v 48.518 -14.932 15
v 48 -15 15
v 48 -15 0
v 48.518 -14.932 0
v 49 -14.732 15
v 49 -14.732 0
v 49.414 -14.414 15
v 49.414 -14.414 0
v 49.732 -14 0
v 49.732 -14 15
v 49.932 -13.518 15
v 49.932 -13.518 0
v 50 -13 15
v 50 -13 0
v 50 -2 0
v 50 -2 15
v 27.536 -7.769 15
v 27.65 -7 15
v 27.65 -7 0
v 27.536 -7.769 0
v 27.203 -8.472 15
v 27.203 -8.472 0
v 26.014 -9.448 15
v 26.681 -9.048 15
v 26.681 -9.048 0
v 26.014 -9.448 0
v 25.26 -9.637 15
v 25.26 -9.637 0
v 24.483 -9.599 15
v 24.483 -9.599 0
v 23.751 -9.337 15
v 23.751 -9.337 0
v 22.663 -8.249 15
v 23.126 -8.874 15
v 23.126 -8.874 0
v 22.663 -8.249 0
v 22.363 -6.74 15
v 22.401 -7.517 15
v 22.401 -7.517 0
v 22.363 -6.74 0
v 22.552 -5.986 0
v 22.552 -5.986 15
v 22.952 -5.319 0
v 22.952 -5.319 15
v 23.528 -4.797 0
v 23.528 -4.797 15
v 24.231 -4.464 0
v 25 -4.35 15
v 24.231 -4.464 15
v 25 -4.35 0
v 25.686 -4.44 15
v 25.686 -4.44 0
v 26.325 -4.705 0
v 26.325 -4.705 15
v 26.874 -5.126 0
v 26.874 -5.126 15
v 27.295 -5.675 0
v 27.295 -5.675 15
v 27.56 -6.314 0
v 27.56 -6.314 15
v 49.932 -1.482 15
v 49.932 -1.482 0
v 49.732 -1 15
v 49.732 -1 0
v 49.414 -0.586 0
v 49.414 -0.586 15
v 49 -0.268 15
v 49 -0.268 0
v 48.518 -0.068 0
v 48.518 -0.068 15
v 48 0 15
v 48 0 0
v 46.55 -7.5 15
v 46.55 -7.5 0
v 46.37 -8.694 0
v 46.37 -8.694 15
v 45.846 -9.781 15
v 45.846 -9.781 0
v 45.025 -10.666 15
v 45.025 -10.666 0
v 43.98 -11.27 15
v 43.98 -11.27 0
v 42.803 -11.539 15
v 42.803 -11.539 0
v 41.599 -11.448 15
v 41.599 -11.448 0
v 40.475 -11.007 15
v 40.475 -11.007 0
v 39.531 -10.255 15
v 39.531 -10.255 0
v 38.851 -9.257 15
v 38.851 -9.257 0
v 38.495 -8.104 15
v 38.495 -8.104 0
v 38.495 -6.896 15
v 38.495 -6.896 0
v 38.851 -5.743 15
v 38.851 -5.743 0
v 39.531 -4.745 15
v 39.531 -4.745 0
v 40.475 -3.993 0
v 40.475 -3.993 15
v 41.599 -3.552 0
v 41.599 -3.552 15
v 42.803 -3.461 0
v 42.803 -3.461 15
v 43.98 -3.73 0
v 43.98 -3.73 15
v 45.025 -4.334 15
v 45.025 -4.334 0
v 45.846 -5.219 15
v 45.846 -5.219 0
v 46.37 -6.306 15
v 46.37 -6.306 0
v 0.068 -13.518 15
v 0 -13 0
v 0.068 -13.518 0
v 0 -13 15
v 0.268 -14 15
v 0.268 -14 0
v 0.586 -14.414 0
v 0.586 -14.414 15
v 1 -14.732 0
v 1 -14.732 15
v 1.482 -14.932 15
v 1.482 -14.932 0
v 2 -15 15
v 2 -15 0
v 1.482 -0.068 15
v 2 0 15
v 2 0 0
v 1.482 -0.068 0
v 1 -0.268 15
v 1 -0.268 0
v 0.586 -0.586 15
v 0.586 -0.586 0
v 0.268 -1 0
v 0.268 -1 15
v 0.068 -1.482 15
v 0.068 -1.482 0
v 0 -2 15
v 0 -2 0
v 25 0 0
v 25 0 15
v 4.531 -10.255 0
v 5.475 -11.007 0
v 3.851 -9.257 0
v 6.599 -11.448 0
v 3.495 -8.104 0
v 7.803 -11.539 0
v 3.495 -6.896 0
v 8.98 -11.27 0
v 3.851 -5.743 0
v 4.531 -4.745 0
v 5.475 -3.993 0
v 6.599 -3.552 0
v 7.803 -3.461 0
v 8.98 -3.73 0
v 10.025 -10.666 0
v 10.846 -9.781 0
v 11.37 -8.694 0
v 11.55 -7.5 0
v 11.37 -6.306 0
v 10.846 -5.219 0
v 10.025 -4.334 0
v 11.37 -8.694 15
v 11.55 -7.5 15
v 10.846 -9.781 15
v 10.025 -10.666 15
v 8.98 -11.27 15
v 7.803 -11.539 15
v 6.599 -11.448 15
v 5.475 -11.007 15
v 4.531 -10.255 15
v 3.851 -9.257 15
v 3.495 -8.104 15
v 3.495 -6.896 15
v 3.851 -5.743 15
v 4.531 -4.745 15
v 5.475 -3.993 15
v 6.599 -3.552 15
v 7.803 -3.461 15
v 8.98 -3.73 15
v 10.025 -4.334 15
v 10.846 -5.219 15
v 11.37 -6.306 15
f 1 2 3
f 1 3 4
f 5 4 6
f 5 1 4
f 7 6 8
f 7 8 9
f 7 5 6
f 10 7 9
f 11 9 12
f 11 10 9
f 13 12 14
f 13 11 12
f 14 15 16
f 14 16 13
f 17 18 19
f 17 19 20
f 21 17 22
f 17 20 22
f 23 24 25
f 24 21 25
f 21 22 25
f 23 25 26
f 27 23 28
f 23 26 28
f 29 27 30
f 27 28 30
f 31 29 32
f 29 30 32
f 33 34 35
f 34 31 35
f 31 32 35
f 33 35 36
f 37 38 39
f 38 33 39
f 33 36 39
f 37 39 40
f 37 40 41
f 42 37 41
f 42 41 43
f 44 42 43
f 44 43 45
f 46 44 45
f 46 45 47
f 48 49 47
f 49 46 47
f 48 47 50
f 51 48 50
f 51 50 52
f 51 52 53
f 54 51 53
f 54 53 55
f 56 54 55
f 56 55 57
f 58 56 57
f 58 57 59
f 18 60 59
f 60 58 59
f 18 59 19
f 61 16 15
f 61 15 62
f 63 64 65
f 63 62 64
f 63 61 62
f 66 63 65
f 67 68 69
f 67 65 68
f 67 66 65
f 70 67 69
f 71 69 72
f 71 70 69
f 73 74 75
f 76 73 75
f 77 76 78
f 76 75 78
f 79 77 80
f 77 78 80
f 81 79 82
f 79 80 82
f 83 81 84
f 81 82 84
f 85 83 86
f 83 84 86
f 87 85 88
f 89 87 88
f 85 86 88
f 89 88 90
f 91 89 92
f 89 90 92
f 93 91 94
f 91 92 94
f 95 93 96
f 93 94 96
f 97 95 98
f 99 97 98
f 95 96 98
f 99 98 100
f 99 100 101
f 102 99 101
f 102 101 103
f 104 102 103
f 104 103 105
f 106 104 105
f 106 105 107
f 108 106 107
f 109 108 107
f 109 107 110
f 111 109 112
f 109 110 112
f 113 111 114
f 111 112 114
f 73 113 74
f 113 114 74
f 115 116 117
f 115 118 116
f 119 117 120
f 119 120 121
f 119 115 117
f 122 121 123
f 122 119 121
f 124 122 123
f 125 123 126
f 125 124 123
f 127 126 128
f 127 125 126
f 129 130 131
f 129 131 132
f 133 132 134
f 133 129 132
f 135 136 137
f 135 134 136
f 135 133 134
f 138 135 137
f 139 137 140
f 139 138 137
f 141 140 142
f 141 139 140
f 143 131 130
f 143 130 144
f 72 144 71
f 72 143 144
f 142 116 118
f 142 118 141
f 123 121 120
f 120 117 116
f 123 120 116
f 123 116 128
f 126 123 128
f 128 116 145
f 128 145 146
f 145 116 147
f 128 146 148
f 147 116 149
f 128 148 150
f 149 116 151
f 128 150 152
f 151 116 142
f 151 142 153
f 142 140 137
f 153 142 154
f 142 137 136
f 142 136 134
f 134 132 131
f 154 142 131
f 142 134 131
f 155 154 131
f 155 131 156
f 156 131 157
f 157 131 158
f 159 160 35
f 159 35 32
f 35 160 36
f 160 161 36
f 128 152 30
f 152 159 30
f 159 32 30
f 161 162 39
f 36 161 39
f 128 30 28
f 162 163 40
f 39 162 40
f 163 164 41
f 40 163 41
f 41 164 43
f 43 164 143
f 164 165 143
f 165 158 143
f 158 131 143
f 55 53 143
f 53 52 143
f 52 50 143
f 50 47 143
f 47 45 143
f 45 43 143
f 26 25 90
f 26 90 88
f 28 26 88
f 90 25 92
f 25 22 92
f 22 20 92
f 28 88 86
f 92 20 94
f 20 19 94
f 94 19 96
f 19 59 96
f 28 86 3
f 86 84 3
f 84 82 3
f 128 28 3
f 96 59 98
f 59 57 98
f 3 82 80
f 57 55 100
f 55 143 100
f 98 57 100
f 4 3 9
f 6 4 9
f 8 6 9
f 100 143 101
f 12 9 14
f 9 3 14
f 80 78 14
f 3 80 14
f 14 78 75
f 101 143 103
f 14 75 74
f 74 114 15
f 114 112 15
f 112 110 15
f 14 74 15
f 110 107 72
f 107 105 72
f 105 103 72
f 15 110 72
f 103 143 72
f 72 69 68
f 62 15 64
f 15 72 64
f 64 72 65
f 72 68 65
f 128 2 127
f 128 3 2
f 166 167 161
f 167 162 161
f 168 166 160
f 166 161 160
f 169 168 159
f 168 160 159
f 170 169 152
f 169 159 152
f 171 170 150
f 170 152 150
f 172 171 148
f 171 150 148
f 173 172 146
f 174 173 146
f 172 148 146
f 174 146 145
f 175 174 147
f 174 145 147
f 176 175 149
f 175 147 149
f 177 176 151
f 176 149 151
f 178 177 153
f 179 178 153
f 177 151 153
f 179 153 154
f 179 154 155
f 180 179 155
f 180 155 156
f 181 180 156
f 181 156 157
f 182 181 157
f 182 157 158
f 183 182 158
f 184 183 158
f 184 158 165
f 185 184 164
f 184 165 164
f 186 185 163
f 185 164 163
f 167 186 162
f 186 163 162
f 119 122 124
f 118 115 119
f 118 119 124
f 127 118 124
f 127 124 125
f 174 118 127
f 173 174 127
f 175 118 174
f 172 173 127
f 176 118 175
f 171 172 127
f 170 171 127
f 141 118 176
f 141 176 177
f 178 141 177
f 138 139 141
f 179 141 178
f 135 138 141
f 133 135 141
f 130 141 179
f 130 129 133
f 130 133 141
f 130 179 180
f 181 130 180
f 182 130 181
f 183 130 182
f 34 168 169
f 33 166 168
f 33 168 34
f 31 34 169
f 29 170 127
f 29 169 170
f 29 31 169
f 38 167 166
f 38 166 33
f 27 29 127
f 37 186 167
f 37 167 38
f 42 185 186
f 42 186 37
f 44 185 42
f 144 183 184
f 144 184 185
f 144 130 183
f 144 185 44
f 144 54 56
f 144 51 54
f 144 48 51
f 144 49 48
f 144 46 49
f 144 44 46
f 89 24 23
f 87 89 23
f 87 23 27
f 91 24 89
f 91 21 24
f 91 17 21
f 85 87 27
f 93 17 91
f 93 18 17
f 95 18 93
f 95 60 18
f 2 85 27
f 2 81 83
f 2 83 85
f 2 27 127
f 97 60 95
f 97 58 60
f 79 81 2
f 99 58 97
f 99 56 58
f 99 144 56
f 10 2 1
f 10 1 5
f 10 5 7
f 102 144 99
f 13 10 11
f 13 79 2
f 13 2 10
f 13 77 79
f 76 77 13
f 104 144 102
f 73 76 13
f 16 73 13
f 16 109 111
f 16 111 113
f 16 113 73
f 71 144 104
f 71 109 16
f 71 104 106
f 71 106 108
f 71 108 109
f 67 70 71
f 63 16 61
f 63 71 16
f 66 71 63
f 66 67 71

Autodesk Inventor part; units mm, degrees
ref_plane "YZ Plane" through (0, 0, 0) normal (1, 0, 0) x (0, 1, 0)
ref_plane "XZ Plane" through (0, 0, 0) normal (0, 1, 0) x (-1, 0, 0)
ref_plane "XY Plane" through (0, 0, 0) normal (0, 0, 1) x (1, 0, 0)
sketch "Sketch1" plane through (0, 0, 0) normal (0, 0, 1) x (1, 0, 0)
  line L0 (0, 0) -> (50, 0)
  line L1 (50, 0) -> (50, -15)
  line L2 (50, -15) -> (0, -15)
  line L3 (0, -15) -> (0, 0)
  line L4 (0, 0) -> (15, -15)
  line L5 (0, 0) -> (21.2132, 0) construction
  circle A0 centre (7.5, -7.5) radius 4.05
  line L6 (50, 0) -> (35, -15)
  circle A1 centre (42.5, -7.5) radius 4.05
  circle A2 centre (25, -7) radius 2.65
  circle A3 centre (7.5, -7.5) radius 7.5
  circle A4 centre (42.5, -7.5) radius 7.5
  line L7 (25, -7) -> (25, 0)
  point P0 (0, 0)
  dimension "d0" = 50
  dimension "d1" = 15
  dimension "d2" = 45
  dimension "d3" = 8.1
  dimension "d4" = 8.1
  dimension "d5" = 45
  dimension "d9" = 0
  dimension "d13" = 0
  dimension "d14" = 5.3
  dimension "d18" = 7
  dimension "d19" = 25
  dimension "d20" = 0
extrude "Extrusion1" add sketch "Sketch1" along normal blind 15 contours L4 A3 L3 | L0 A3 L4 | L0 A4 L6 L2 L4 A3 | A3 L4 A0 | A3 L2 L3 | A3 L4 A0 | A3 L4 L2 | L0 L6 A4 | A4 L6 A1 | L1 A4 L6 | A4 L6 A1 | A4 L2 L6 | L1 L2 A4
fillet "Fillet1" radius 2 4 edges at (50, -15, 7.5) (50, 0, 7.5) (0, -15, 7.5) (0, 0, 7.5)
properties part number "Support_Seperator(Middle rod)"
